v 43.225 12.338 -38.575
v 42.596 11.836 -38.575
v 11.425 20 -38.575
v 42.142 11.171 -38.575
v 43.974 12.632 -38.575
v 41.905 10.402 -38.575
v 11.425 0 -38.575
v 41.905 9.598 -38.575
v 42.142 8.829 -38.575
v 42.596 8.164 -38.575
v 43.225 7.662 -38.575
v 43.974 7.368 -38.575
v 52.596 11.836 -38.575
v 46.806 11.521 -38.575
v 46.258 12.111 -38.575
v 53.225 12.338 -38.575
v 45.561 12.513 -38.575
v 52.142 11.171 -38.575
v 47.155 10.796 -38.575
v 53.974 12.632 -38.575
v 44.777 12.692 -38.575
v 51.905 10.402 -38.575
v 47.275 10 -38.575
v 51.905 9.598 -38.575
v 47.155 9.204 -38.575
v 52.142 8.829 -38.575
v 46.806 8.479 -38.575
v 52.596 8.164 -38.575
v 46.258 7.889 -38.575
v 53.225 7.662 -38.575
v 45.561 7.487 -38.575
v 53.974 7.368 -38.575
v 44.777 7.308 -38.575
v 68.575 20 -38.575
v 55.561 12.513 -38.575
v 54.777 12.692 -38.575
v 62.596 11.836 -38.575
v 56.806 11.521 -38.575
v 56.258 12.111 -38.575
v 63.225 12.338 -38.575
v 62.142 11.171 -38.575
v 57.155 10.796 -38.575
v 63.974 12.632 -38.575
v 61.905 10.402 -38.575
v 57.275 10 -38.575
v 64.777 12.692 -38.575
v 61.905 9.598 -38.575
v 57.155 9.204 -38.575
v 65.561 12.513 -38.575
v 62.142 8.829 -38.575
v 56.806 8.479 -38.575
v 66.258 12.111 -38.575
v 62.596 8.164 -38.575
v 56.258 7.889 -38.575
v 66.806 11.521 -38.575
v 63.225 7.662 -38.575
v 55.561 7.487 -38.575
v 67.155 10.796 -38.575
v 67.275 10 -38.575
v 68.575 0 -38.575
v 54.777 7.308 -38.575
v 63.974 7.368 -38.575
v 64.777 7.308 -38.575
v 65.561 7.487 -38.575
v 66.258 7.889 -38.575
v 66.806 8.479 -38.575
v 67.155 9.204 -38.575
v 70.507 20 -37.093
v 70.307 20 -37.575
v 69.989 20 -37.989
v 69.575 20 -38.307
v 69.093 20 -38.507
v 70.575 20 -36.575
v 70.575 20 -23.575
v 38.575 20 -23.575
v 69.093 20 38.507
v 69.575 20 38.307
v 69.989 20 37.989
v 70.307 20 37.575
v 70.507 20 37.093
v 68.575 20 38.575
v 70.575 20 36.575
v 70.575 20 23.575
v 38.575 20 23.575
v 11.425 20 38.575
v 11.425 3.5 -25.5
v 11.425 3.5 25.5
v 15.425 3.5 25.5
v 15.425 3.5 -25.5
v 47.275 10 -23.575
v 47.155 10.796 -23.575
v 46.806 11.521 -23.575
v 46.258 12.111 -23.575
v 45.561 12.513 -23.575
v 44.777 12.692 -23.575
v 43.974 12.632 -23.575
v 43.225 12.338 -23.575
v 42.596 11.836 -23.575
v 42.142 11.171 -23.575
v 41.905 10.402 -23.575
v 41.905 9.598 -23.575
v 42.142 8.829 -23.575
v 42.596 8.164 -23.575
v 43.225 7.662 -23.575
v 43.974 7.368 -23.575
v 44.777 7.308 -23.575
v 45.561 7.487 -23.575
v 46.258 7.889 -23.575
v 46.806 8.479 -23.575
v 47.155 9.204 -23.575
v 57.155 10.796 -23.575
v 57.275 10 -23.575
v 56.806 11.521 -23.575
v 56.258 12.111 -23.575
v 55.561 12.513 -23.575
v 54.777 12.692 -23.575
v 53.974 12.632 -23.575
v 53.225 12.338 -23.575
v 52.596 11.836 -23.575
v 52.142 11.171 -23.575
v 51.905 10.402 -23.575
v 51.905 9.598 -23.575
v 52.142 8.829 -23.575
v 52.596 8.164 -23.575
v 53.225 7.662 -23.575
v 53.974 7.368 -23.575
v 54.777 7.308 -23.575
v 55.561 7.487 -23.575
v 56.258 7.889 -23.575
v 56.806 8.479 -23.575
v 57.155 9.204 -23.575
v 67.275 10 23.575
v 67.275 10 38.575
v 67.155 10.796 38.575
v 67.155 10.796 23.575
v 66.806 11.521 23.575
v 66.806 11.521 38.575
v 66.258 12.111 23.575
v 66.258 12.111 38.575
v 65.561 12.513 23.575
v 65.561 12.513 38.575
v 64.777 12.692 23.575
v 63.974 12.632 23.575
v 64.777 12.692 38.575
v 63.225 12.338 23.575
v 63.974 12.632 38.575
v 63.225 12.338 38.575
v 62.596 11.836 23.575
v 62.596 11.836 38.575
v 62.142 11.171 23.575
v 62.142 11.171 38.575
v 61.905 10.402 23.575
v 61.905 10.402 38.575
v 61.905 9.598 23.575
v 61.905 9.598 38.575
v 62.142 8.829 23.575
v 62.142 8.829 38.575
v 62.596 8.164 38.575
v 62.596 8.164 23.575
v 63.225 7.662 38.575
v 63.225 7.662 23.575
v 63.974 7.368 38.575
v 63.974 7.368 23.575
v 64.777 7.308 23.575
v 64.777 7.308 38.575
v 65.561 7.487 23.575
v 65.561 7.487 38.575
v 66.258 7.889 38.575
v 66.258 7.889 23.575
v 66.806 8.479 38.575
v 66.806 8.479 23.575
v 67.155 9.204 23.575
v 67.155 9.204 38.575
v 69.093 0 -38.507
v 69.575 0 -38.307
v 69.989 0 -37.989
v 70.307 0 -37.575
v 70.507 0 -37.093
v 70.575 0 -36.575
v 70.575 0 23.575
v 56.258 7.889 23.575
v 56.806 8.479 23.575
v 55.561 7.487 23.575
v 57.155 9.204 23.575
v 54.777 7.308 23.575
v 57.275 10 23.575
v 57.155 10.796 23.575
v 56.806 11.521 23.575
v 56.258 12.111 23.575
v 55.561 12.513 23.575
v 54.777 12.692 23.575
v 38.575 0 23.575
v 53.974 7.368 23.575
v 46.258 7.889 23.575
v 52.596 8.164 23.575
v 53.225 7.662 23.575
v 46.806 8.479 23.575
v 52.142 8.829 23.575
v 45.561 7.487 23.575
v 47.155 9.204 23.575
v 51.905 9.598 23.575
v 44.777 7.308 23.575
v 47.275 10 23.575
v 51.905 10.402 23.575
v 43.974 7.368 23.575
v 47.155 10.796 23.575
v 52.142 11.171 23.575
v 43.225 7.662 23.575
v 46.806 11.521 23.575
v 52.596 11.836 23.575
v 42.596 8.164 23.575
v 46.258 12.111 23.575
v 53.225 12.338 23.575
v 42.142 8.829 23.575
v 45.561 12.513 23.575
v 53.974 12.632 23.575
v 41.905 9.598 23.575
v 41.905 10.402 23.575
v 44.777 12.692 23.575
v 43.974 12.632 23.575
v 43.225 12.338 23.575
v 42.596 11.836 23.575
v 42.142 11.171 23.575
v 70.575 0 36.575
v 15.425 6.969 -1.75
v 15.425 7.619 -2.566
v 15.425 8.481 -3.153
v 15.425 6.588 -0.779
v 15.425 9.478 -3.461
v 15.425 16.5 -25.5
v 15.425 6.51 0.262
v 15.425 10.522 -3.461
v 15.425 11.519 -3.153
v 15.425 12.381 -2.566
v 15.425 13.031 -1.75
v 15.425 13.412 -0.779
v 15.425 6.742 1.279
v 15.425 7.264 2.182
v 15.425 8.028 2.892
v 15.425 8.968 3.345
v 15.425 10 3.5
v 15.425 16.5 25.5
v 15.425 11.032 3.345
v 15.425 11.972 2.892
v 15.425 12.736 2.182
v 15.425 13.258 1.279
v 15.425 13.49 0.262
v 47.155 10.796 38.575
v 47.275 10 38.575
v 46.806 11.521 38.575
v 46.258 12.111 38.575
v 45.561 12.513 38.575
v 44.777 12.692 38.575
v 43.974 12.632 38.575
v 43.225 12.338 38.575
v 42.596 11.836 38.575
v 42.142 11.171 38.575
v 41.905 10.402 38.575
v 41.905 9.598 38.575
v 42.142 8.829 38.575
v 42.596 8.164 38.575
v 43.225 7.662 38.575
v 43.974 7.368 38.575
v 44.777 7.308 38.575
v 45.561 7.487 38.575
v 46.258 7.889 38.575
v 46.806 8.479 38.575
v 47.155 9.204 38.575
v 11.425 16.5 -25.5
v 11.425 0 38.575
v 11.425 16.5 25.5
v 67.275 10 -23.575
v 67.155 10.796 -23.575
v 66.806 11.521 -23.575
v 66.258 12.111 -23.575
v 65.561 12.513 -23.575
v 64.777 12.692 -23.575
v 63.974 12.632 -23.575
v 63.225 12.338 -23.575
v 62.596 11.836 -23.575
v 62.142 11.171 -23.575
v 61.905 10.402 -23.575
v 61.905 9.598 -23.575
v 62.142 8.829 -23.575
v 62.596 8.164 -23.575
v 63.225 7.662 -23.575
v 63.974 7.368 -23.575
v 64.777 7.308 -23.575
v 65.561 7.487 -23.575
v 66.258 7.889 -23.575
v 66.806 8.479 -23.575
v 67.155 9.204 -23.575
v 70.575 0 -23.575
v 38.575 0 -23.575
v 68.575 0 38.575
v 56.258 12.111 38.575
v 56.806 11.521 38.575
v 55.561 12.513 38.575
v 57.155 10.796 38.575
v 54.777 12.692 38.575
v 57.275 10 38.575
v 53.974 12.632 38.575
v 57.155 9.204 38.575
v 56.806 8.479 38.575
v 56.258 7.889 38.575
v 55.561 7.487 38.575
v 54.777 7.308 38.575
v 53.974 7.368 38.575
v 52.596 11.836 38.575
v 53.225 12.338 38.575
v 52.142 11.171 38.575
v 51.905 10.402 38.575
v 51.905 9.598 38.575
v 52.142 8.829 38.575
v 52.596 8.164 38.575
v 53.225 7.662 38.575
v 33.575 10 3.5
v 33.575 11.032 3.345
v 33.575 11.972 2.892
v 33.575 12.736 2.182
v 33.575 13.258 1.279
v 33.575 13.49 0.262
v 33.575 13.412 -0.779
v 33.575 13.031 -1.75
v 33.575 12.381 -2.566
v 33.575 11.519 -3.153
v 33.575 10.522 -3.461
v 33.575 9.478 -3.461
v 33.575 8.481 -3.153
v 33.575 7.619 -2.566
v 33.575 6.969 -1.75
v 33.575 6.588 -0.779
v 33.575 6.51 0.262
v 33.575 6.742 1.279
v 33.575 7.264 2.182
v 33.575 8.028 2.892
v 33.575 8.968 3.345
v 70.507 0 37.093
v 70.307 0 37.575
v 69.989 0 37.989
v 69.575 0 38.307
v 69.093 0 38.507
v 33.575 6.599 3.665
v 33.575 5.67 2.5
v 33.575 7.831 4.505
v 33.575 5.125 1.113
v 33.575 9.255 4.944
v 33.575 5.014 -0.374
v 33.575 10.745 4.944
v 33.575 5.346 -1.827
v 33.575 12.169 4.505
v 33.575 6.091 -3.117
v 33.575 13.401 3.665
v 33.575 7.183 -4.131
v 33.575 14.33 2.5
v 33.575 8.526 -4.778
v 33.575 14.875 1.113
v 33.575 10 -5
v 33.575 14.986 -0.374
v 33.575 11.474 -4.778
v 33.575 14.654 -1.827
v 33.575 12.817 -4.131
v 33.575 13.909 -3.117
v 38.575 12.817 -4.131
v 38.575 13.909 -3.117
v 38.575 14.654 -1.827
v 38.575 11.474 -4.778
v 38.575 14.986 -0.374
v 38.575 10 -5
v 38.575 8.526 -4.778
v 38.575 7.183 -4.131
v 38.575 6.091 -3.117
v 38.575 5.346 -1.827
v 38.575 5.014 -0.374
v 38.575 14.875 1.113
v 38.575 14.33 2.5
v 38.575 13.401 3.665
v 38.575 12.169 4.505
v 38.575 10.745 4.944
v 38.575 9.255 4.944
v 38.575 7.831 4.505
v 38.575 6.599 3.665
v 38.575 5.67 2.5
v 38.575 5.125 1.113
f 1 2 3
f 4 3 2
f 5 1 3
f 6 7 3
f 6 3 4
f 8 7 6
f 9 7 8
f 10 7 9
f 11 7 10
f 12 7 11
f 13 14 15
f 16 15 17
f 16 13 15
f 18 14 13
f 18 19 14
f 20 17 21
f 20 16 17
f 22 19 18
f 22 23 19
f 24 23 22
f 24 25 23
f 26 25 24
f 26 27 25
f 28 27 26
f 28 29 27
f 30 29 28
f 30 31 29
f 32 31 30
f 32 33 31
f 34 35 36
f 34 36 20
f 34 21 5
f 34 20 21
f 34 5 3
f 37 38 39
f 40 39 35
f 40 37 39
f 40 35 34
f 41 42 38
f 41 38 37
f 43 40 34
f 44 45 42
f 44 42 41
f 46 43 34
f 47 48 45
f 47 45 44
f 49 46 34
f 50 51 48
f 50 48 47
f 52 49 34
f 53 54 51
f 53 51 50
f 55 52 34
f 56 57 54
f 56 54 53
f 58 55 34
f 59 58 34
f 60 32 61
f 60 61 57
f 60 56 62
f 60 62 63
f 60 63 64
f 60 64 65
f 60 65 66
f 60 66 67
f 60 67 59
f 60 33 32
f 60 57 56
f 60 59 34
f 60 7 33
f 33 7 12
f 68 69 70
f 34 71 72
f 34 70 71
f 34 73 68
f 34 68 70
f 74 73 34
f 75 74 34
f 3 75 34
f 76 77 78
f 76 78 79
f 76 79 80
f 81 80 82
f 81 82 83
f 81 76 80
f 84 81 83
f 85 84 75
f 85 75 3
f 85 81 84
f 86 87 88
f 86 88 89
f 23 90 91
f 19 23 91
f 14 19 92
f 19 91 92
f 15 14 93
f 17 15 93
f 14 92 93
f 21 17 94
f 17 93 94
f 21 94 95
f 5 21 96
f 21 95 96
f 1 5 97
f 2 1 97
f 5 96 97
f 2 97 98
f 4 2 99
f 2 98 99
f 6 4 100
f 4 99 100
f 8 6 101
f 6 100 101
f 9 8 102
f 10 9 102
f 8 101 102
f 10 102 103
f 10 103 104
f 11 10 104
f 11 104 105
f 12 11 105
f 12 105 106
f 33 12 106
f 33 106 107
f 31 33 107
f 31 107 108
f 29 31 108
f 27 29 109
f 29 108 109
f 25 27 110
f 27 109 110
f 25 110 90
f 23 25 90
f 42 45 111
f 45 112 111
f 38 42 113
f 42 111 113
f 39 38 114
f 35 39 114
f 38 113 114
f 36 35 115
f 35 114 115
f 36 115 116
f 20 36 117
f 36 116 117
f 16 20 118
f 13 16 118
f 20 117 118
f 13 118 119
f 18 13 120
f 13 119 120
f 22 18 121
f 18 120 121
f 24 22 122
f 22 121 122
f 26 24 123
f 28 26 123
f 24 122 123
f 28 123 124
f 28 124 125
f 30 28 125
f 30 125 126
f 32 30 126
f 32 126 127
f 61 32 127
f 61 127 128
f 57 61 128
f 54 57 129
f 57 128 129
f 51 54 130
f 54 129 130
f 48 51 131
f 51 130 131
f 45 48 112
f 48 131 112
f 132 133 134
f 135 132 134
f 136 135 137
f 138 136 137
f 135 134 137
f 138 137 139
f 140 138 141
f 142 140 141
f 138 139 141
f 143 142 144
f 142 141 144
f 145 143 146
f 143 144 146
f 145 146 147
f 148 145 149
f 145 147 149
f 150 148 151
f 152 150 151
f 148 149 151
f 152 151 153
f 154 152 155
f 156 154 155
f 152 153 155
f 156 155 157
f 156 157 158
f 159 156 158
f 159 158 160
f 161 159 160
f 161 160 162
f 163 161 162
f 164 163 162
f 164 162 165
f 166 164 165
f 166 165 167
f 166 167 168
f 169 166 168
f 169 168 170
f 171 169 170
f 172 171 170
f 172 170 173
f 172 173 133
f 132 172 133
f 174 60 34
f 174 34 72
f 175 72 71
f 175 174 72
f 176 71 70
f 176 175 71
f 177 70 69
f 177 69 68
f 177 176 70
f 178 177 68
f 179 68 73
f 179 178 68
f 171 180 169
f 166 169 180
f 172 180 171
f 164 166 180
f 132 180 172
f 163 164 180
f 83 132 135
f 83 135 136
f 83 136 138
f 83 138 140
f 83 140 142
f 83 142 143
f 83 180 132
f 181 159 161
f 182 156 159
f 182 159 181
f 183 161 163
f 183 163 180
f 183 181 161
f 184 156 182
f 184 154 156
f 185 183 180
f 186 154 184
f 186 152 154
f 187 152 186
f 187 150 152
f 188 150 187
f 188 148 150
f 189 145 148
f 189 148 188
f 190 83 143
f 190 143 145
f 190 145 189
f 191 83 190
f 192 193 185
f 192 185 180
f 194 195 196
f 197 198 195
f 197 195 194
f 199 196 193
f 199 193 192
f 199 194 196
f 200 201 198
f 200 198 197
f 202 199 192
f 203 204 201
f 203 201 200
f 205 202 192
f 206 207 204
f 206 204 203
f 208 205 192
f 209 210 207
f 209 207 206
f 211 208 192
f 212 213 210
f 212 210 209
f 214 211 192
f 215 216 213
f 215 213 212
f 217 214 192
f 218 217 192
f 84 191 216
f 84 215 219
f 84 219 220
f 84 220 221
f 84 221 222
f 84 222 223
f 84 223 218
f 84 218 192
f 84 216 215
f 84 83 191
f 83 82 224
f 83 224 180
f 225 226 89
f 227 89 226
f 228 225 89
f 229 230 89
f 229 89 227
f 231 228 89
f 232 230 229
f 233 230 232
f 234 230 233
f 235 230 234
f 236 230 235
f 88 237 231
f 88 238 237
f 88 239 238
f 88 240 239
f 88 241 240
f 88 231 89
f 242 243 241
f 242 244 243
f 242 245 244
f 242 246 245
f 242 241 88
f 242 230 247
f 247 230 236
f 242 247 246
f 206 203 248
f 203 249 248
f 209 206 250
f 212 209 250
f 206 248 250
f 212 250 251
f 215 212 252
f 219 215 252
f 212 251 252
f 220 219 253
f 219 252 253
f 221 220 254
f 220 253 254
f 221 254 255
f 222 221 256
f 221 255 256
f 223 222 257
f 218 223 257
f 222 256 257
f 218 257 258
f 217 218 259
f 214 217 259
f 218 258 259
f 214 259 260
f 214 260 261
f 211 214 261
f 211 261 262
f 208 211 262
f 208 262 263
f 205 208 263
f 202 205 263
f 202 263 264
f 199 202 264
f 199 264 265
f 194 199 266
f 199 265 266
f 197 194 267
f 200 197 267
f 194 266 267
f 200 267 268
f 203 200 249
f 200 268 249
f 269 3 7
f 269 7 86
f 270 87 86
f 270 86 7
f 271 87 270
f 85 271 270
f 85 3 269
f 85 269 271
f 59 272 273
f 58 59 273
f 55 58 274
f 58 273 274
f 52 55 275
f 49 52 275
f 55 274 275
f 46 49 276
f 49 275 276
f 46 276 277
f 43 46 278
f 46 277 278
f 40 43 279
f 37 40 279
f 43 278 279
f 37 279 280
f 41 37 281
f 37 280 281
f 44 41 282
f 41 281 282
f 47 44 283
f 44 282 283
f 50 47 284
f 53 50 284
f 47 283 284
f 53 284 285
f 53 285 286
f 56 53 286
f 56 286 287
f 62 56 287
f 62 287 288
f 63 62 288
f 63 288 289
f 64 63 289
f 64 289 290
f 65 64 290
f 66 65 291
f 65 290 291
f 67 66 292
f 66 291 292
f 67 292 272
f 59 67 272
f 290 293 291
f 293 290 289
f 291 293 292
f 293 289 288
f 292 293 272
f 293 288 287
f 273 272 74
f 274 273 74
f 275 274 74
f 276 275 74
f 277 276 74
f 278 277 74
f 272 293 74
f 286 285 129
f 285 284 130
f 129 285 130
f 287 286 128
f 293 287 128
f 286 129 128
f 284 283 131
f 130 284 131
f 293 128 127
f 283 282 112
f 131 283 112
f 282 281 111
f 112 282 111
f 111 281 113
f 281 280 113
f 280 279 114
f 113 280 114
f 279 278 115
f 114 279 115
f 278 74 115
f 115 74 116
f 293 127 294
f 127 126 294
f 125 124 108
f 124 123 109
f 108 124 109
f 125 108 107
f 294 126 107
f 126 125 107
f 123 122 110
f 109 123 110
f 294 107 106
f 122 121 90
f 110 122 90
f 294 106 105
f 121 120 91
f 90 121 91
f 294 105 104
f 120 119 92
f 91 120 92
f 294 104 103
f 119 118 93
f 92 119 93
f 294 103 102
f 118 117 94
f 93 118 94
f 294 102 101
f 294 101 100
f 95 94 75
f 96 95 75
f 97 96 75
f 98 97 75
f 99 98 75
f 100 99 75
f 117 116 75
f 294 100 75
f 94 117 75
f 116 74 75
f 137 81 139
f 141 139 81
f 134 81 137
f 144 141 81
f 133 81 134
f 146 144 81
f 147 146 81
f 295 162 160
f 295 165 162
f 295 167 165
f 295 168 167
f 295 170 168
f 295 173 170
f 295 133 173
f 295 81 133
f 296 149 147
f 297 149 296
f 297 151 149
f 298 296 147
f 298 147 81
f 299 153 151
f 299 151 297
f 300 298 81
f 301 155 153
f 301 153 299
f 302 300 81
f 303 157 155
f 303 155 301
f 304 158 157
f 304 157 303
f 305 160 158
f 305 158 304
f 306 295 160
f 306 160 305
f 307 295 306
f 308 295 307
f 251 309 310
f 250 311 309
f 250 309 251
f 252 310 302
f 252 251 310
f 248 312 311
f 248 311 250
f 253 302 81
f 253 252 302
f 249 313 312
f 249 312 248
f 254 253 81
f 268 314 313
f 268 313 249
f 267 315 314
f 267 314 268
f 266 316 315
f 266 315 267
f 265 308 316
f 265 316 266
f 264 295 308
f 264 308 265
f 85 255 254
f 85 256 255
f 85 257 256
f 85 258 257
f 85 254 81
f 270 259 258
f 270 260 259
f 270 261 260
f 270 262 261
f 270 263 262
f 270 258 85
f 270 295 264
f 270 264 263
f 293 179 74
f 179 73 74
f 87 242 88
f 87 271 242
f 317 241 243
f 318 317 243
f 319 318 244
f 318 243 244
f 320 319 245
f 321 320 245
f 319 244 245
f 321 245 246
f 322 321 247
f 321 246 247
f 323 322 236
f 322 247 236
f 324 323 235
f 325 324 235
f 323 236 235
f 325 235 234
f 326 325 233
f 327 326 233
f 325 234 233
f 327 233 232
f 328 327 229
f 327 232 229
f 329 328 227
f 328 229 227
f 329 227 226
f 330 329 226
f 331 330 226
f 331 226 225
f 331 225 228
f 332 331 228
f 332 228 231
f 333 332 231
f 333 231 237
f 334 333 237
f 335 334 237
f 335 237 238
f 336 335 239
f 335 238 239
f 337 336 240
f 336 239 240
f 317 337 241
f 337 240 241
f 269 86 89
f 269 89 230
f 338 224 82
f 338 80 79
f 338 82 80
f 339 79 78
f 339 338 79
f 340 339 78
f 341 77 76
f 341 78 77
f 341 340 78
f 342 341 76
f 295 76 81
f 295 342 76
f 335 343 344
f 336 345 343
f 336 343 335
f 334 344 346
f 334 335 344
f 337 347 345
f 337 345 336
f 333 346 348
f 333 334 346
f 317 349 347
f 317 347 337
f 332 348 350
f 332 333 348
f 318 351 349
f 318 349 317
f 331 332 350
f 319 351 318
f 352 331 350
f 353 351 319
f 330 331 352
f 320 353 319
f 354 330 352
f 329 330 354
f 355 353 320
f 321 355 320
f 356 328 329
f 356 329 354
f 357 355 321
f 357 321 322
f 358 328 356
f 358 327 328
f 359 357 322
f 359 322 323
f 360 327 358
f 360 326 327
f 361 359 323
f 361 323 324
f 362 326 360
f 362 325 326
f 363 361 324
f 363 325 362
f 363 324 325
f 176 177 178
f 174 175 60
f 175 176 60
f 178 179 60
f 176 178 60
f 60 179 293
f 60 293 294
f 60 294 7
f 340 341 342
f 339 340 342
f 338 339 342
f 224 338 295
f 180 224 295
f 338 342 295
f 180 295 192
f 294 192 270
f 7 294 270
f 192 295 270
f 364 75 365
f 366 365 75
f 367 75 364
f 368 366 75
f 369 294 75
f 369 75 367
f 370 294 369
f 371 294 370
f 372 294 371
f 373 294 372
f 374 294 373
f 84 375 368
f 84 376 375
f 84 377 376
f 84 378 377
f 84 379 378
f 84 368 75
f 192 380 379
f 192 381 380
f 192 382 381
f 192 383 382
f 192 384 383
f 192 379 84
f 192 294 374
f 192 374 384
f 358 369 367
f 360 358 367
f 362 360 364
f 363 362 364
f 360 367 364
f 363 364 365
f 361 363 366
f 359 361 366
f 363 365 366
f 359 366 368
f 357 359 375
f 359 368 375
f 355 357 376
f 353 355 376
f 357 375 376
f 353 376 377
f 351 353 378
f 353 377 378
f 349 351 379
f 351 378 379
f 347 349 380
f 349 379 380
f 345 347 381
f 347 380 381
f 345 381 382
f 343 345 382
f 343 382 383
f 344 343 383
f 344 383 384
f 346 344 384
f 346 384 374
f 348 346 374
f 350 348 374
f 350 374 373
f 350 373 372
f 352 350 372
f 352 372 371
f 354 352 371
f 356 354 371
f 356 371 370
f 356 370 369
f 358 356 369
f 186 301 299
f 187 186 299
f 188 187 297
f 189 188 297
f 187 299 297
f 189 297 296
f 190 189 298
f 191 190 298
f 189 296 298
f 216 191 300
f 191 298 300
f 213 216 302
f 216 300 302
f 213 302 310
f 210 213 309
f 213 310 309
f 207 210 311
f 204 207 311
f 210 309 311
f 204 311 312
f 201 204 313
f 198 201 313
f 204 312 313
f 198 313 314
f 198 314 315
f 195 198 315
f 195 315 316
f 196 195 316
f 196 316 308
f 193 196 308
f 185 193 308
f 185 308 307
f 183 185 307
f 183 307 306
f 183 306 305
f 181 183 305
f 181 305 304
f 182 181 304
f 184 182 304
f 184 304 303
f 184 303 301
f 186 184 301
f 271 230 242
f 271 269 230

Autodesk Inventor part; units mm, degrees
ref_plane "YZ Plane" through (0, 0, 0) normal (1, 0, 0) x (0, 1, 0)
ref_plane "XZ Plane" through (0, 0, 0) normal (0, 1, 0) x (-1, 0, 0)
ref_plane "XY Plane" through (0, 0, 0) normal (0, 0, 1) x (1, 0, 0)
sketch "Boceto1" plane through (0, 0, 0) normal (0, 1, 0) x (-1, 0, 0)
  line L0 (-38.575, 38.575) -> (38.575, 38.575)
  line L1 (38.575, 38.575) -> (38.575, -38.575)
  line L2 (38.575, -38.575) -> (-38.575, -38.575)
  line L3 (-38.575, -38.575) -> (-38.575, 38.575)
  line L4 (-38.575, 38.575) -> (38.575, -38.575) construction
  line L5 (38.575, 38.575) -> (-38.575, -38.575) construction
  circle A0 centre (17, 10) radius 2.7
  circle A1 centre (17, -10) radius 2.7
  circle A2 centre (-17, -10) radius 2.7
  circle A3 centre (-17, 10) radius 2.7
  point P0 (0, 0)
  dimension "d0" = 77.15
  dimension "d1" = 77.15
  dimension "d2" = 5.4
  dimension "d3" = 10
  dimension "d4" = 10
  dimension "d5" = 17
  dimension "d6" = 17
extrude "Extrusión1" add sketch "Boceto1" along normal blind 20
sketch "Boceto2" plane through (0, 20, 0) normal (0, 1, 0) x (1, 0, 0)
  line L0 (-38.575, -38.575) -> (38.575, -38.575) projected
  line L1 (38.575, -38.575) -> (70.575, -38.575)
  line L2 (70.575, -38.575) -> (70.575, -23.575)
  line L3 (70.575, -23.575) -> (38.575, -23.575)
  line L4 (38.575, -23.575) -> (38.575, -38.575)
  line L5 (38.575, 38.575) -> (-38.575, 38.575) projected
  line L6 (38.575, 38.575) -> (70.575, 38.575)
  line L7 (70.575, 38.575) -> (70.575, 23.575)
  line L8 (70.575, 23.575) -> (38.575, 23.575)
  line L9 (38.575, 23.575) -> (38.575, 38.575)
  point P0 (0, 0)
  dimension "d9" = 32
  dimension "d10" = 15
extrude "Extrusión2" add sketch "Boceto2" against normal up to surface (20 mm away)
sketch "Boceto3" plane through (-38.575, 0, 38.575) normal (0, 0, 1) x (1, 0, 0)
  circle A0 centre (103.15, 10) radius 2.7
  circle A1 centre (93.15, 10) radius 2.7
  line L0 (109.15, 20) -> (109.15, 0) projected
  circle A2 centre (83.15, 10) radius 2.7
  point P0 (38.575, 0)
  dimension "d13" = 5.4
  dimension "d14" = 6
  dimension "d15" = 10
  dimension "d34" = 10
extrude "Extrusión3" cut sketch "Boceto3" against normal through all
fillet "Empalme2" radius 4.635 2 edges at (-38.575, 10, 38.575) (-38.575, 10, -38.575)
fillet "Empalme3" radius 2 2 edges at (70.575, 10, -38.575) (70.575, 10, 38.575)
sketch "Boceto5" plane through (0, 20, 0) normal (0, 1, 0) x (1, 0, 0)
  line L0 (-29.2306, -22.0337) -> (29.2306, -22.0337)
  line L1 (29.2306, -22.0337) -> (29.2306, 22.0337)
  line L2 (29.2306, 22.0337) -> (-29.2306, 22.0337)
  line L3 (-29.2306, 22.0337) -> (-29.2306, -22.0337)
  line L4 (-29.2306, -22.0337) -> (29.2306, 22.0337) construction
  line L5 (29.2306, -22.0337) -> (-29.2306, 22.0337) construction
  point P0 (0, 0)
extrude "Extrusión5" add sketch "Boceto5" against normal up to surface (20 mm away)
sketch "Boceto6" plane through (-38.575, 0, -33.94) normal (-1, 0, 0) x (0, 0, 1)
  line L0 (-23.6354, 28.4555) -> (91.5154, 28.4555)
  line L1 (91.5154, 28.4555) -> (91.5154, -11.4044)
  line L2 (91.5154, -11.4044) -> (-23.6354, -11.4044)
  line L3 (-23.6354, -11.4044) -> (-23.6354, 28.4555)
  line L4 (-23.6354, 28.4555) -> (91.5154, -11.4044) construction
  line L5 (91.5154, 28.4555) -> (-23.6354, -11.4044) construction
  point P0 (33.94, 0)
  point P1 (33.94, 8.5256)
extrude "Extrusión6" cut sketch "Boceto6" against normal blind 50
sketch "Boceto7" plane through (11.425, 0, -33.94) normal (-1, 0, 0) x (0, 0, 1)
  line L0 (59.44, 3.5) -> (8.44, 3.5)
  line L1 (8.44, 3.5) -> (8.44, 16.5)
  line L2 (8.44, 16.5) -> (59.44, 16.5)
  line L3 (59.44, 16.5) -> (59.44, 3.5)
  line L4 (59.44, 3.5) -> (8.44, 16.5) construction
  line L5 (8.44, 3.5) -> (59.44, 16.5) construction
  line L6 (72.515, 0) -> (-4.635, 0) projected
  point P0 (33.94, 0)
  point P1 (33.94, 10)
  point P2 (33.94, 10)
  point P3 (33.94, 0)
  dimension "d39" = 13
  dimension "d40" = 51
  dimension "d41" = 3.5
extrude "Extrusión7" cut sketch "Boceto7" against normal blind 4
sketch "Boceto8" plane through (15.425, 0, -33.94) normal (-1, 0, 0) x (0, 0, 1)
  circle A0 centre (33.94, 10) radius 3.5
  point P0 (33.94, 0)
  dimension "d44" = 7
extrude "Extrusión8" cut sketch "Boceto8" against normal through all
sketch "Boceto9" plane through (38.575, 0, 23.575) normal (1, 0, 0) x (0, 0, -1)
  circle A0 centre (23.575, 10) radius 3.5 projected
  circle A1 centre (23.575, 10) radius 5
  point P0 (23.575, 0)
  dimension "d47" = 10
extrude "Extrusión9" cut sketch "Boceto9" against normal blind 5 contours A0 | A1
sketch "Boceto4" plane through (0, 20, 0) normal (0, 1, 0) x (1, 0, 0)
  line L0 (53.225, -32.695) -> (61.325, -32.695)
  line L1 (61.325, -32.695) -> (61.325, -28.455)
  line L2 (61.325, -28.455) -> (53.225, -28.455)
  line L3 (53.225, -28.455) -> (53.225, -32.695)
  line L4 (53.225, -32.695) -> (61.325, -28.455) construction
  line L5 (61.325, -32.695) -> (53.225, -28.455) construction
  line L6 (57.275, -38.575) -> (51.875, -38.575) projected
  point P0 (0, 0)
  point P1 (57.275, -30.575)
  dimension "d21" = 8.1
  dimension "d23" = 1.35
  dimension "d24" = 8
  dimension "d25" = 4.24
properties part number "LowerJawLoadCell" material "Plástico ABS"
